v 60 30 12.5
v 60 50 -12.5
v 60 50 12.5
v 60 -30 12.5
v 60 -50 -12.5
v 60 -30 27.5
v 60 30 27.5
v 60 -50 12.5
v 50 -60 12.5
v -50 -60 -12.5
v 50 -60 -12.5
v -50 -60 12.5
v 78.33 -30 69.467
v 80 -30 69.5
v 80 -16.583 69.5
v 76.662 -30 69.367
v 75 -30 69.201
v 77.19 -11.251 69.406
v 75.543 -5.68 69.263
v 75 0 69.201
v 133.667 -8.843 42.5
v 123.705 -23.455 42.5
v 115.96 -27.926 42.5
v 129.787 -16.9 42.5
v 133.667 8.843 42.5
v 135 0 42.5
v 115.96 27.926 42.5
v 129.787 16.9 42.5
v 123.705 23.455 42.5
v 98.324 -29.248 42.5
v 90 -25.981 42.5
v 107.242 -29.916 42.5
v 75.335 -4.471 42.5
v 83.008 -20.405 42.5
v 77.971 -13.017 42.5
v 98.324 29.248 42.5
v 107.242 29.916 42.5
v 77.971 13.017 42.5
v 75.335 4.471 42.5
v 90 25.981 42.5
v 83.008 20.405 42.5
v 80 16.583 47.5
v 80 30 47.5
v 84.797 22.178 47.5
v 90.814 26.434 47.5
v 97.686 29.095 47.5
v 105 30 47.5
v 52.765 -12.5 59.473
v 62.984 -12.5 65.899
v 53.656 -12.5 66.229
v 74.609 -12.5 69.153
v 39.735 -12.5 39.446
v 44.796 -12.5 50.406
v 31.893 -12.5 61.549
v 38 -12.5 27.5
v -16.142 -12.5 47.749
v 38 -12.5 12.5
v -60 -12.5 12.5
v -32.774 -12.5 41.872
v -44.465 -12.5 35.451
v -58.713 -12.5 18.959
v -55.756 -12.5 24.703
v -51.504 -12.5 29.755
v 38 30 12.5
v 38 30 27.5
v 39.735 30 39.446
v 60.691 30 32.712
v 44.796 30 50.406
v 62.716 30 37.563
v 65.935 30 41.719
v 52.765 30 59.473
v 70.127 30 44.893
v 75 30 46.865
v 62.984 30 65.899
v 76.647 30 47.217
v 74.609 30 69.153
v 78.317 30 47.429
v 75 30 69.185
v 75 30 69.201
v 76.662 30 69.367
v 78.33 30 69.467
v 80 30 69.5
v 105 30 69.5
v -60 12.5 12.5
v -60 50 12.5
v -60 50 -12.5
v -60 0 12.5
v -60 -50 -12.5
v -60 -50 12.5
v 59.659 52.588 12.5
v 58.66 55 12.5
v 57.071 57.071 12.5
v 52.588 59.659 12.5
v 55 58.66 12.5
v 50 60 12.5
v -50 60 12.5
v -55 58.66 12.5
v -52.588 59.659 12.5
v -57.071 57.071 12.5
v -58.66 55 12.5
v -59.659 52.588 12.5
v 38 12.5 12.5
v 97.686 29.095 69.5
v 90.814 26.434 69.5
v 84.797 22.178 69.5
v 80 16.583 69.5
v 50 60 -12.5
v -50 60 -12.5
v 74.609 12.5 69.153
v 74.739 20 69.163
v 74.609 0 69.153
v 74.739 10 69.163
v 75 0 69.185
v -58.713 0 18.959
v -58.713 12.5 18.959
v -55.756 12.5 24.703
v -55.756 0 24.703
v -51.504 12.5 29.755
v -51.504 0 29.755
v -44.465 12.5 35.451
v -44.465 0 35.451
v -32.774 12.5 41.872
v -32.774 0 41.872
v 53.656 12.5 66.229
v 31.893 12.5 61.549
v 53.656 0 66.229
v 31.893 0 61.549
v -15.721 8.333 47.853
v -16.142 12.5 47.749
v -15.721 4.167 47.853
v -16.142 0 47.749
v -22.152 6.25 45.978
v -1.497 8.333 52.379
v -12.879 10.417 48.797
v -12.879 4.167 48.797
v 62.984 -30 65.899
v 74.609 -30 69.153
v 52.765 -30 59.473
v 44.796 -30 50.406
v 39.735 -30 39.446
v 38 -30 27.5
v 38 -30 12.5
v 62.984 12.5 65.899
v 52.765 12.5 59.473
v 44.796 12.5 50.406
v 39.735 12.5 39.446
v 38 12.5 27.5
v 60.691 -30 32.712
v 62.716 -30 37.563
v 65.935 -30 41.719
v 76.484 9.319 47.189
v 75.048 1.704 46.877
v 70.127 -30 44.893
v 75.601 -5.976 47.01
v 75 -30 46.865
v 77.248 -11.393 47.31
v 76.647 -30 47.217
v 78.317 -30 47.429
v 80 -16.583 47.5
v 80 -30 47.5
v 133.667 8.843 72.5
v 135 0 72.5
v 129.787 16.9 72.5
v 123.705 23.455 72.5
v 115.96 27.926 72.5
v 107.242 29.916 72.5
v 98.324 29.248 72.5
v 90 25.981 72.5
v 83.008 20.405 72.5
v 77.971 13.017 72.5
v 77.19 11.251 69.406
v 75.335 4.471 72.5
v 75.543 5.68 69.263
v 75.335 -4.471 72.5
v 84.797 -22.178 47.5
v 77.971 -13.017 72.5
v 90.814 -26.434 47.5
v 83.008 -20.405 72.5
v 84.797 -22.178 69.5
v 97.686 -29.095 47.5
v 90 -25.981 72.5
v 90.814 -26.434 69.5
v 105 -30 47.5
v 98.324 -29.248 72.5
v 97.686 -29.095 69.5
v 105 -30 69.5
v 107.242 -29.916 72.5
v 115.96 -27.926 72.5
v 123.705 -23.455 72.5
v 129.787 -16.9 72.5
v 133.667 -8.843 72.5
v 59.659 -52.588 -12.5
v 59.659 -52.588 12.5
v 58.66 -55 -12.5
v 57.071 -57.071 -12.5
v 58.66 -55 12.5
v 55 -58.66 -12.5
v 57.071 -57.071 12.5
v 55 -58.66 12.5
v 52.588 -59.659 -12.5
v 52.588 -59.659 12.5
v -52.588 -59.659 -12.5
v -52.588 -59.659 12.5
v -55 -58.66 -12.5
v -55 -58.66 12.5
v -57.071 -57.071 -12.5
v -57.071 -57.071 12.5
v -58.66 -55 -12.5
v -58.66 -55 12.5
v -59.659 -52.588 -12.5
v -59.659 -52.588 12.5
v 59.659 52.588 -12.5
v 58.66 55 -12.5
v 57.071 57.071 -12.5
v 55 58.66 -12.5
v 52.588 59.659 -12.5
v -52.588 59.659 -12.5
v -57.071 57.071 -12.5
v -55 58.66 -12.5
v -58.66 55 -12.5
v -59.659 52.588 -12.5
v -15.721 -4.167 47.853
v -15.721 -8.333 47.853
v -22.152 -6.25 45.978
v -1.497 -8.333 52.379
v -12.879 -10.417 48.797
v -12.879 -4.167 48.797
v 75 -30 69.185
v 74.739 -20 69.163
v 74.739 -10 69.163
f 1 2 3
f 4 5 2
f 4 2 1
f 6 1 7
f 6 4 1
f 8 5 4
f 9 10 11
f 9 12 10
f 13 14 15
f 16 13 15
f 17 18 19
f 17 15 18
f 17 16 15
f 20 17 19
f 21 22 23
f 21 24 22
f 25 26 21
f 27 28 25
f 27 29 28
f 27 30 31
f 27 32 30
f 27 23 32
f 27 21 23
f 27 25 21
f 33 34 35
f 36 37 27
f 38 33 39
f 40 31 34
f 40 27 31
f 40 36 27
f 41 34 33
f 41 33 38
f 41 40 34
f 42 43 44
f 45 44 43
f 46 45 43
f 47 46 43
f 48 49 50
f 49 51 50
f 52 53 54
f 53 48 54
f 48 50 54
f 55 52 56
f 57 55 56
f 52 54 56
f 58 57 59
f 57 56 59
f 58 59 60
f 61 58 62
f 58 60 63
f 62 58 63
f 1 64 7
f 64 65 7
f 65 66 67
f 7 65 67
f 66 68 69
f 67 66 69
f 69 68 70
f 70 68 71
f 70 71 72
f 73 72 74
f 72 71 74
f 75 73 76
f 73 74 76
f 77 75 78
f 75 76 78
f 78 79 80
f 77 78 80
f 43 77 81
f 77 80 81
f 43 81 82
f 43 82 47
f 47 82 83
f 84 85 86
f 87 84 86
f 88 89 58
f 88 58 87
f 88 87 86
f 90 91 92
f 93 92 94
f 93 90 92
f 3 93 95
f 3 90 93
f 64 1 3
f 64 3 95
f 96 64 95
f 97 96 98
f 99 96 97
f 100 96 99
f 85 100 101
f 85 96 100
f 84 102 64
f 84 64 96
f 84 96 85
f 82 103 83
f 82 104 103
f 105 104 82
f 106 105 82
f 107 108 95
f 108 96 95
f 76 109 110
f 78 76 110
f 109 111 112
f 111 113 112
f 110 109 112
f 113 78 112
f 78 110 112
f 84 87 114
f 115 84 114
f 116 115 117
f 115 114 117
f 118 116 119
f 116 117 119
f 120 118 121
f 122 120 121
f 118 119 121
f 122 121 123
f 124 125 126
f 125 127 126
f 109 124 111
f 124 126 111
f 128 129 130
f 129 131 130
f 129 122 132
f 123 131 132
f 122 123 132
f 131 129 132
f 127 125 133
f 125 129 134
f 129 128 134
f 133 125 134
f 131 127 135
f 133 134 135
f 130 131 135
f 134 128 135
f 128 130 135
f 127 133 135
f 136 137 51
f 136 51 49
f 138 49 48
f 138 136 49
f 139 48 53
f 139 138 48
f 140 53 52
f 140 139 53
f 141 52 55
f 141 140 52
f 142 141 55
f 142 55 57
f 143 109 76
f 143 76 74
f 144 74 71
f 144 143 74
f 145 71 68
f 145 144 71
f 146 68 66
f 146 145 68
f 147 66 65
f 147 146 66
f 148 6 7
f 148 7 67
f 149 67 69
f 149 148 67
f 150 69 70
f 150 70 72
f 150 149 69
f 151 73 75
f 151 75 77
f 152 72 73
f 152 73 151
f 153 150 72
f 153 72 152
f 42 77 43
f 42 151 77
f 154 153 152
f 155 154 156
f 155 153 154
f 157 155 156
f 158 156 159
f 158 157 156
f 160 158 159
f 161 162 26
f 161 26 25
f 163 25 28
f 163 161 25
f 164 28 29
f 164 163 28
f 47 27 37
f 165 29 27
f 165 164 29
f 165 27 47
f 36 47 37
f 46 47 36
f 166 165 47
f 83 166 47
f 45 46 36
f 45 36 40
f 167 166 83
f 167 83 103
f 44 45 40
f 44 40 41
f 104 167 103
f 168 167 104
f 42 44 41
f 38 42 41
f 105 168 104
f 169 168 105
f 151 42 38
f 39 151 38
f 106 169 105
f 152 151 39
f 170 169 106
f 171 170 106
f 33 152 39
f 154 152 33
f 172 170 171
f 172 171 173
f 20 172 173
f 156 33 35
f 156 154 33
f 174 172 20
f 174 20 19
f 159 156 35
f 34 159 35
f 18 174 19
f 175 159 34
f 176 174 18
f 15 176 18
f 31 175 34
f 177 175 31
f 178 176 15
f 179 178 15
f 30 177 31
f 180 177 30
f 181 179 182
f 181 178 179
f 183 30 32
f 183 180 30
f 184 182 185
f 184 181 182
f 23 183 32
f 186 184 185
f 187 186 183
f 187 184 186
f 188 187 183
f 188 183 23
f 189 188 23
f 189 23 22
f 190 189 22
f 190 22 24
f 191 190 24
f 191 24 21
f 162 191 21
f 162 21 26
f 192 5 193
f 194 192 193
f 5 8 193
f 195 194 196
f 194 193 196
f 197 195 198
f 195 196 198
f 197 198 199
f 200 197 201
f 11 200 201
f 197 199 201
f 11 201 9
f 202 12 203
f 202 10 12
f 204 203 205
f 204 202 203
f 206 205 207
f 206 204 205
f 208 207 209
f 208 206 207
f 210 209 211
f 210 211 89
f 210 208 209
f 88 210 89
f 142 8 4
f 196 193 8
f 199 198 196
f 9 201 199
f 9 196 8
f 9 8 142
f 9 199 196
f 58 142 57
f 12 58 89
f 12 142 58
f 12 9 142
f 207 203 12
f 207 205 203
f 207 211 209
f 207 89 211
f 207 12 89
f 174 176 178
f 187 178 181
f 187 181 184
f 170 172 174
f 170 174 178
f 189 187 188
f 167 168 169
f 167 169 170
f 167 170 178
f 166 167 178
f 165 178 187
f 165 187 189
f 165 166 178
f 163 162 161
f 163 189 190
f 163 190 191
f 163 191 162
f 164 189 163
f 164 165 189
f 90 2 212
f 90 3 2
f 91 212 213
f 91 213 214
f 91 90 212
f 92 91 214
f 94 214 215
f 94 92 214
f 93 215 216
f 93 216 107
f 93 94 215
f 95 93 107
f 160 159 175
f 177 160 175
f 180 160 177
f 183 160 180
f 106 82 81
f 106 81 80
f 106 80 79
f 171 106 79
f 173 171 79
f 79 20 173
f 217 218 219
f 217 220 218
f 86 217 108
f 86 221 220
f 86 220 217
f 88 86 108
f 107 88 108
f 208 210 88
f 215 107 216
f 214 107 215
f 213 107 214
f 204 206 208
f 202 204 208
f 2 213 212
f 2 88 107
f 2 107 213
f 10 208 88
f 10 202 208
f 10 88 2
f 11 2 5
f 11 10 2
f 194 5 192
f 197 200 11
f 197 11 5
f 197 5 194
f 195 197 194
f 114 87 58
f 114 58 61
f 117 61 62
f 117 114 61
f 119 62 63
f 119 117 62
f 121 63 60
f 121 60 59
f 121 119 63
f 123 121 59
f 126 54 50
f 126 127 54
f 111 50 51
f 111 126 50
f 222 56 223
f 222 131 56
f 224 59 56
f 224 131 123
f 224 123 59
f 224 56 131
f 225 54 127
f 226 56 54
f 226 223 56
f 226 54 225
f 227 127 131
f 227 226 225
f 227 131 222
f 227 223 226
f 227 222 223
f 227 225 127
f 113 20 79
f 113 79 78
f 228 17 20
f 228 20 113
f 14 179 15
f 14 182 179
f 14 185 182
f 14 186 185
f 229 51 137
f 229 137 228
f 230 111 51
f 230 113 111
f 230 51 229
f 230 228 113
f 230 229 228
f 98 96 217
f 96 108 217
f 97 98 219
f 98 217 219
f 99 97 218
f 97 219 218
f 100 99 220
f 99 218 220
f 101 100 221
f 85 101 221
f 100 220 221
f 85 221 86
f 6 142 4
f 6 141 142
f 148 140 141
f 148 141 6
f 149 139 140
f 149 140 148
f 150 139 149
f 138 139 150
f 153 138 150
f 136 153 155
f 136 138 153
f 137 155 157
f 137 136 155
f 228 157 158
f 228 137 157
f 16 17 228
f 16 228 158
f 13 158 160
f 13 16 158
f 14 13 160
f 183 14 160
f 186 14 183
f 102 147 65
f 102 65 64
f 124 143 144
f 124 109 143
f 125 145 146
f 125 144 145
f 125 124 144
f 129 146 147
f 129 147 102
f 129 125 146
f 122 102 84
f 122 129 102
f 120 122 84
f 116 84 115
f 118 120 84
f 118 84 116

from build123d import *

# Parameters (mm, degrees)
F1_DEPTH = 60
F2_DEPTH = 30
F3_DEPTH = 12.5
F5_R     = 10


# Not quite as in the source:
# - a feature names something its author has since deleted; it is built from what else it names


with BuildPart() as f1:
    # F0 (on Front) → F1 (new body, symmetric)
    with BuildSketch(Plane.XZ):
        Polygon((-60, 12.5), (-60, -12.5), (60, -12.5), (60, 12.5), (38, 12.5), align=None)
    extrude(amount=F1_DEPTH, both=True)

    # F0 (on Front) → F2 (join, symmetric)
    with BuildSketch(Plane.XZ):
        with BuildLine():
            Line((38, 12.5), (60, 12.5))
            Line((60, 12.5), (60, 27.5))
            ThreePointArc((60, 27.5), (64.1886116992, 39.7474487139), (75, 46.864916731))
            Line((75, 46.864916731), (75, 69.1849707307))
            add(Edge.make_bspline(
                [(74.6086884092, 69.1525360492), (74.7393390429, 69.163538875), (74.8697772932, 69.1743509337), (75, 69.1849707307)],
                knots=[0.9728827871, 0.9728827871, 0.9728827871, 0.9728827871, 0.9748058763, 0.9748058763, 0.9748058763, 0.9748058763], degree=3))
            ThreePointArc((74.6086884092, 69.1525360492), (48.4529313025, 55.2269265623), (38, 27.5))
            Line((38, 27.5), (38, 12.5))
        make_face()
        with BuildLine():
            ThreePointArc((80, 69.5), (77.4955434529, 69.425263236), (75, 69.201318924))
            Line((75, 69.201318924), (75, 69.1849707307))
            add(Edge.make_bspline(
                [(75, 69.1849707307), (76.7060295657, 69.324099213), (78.3750648422, 69.4302293108), (80, 69.5)],
                knots=[0.9748058763, 0.9748058763, 0.9748058763, 0.9748058763, 1, 1, 1, 1], degree=3))
        make_face()
        with BuildLine():
            add(Edge.make_bspline(
                [(75, 69.1849707307), (76.7060295657, 69.324099213), (78.3750648422, 69.4302293108), (80, 69.5)],
                knots=[0.9748058763, 0.9748058763, 0.9748058763, 0.9748058763, 1, 1, 1, 1], degree=3))
            Line((75, 69.1849707307), (75, 46.864916731))
            ThreePointArc((75, 46.864916731), (77.4799141503, 47.3405939253), (80, 47.5))
            Line((80, 47.5), (105, 47.5))
            Line((105, 47.5), (105, 69.5))
            Line((105, 69.5), (80, 69.5))
        make_face()
    extrude(amount=F2_DEPTH, both=True)

    # F0 (on Front) → F3 (join, symmetric)
    with BuildSketch(Plane.XZ):
        with BuildLine():
            add(Edge.make_bspline(
                [(-60, 12.5), (-58.7895740645, 37.710647482), (-15.7147551824, 47.8502400891), (-15.7294783827, 47.857399648), (37.8509932243, 66.056963491), (74.6086884092, 69.1525360492)],
                knots=[0, 0, 0, 0, 0.4317155285, 0.4318343159, 0.9728827871, 0.9728827871, 0.9728827871, 0.9728827871], degree=3))
            Line((-60, 12.5), (38, 12.5))
            Line((38, 12.5), (38, 27.5))
            ThreePointArc((38, 27.5), (48.4529313025, 55.2269265623), (74.6086884092, 69.1525360492))
        make_face()
    extrude(amount=F3_DEPTH, both=True)

    # F0 (on Front) → F4 (revolve)
    with BuildSketch(Plane.XZ):
        Polygon((135, 72.5), (105, 72.5), (105, 69.5), (105, 47.5), (105, 42.5), (135, 42.5), align=None)
    revolve(axis=Axis((105, 0, 58.5), (0, 0, 1)))

    # F5
    f5_edges = [f1.edges().sort_by_distance(p)[0] for p in [
        (-60, -60, 0),
        (60, -60, 0),
        (60, 60, 0),
        (-60, 60, 0),
    ]]
    fillet(f5_edges, radius=F5_R)


solid = f1.part
